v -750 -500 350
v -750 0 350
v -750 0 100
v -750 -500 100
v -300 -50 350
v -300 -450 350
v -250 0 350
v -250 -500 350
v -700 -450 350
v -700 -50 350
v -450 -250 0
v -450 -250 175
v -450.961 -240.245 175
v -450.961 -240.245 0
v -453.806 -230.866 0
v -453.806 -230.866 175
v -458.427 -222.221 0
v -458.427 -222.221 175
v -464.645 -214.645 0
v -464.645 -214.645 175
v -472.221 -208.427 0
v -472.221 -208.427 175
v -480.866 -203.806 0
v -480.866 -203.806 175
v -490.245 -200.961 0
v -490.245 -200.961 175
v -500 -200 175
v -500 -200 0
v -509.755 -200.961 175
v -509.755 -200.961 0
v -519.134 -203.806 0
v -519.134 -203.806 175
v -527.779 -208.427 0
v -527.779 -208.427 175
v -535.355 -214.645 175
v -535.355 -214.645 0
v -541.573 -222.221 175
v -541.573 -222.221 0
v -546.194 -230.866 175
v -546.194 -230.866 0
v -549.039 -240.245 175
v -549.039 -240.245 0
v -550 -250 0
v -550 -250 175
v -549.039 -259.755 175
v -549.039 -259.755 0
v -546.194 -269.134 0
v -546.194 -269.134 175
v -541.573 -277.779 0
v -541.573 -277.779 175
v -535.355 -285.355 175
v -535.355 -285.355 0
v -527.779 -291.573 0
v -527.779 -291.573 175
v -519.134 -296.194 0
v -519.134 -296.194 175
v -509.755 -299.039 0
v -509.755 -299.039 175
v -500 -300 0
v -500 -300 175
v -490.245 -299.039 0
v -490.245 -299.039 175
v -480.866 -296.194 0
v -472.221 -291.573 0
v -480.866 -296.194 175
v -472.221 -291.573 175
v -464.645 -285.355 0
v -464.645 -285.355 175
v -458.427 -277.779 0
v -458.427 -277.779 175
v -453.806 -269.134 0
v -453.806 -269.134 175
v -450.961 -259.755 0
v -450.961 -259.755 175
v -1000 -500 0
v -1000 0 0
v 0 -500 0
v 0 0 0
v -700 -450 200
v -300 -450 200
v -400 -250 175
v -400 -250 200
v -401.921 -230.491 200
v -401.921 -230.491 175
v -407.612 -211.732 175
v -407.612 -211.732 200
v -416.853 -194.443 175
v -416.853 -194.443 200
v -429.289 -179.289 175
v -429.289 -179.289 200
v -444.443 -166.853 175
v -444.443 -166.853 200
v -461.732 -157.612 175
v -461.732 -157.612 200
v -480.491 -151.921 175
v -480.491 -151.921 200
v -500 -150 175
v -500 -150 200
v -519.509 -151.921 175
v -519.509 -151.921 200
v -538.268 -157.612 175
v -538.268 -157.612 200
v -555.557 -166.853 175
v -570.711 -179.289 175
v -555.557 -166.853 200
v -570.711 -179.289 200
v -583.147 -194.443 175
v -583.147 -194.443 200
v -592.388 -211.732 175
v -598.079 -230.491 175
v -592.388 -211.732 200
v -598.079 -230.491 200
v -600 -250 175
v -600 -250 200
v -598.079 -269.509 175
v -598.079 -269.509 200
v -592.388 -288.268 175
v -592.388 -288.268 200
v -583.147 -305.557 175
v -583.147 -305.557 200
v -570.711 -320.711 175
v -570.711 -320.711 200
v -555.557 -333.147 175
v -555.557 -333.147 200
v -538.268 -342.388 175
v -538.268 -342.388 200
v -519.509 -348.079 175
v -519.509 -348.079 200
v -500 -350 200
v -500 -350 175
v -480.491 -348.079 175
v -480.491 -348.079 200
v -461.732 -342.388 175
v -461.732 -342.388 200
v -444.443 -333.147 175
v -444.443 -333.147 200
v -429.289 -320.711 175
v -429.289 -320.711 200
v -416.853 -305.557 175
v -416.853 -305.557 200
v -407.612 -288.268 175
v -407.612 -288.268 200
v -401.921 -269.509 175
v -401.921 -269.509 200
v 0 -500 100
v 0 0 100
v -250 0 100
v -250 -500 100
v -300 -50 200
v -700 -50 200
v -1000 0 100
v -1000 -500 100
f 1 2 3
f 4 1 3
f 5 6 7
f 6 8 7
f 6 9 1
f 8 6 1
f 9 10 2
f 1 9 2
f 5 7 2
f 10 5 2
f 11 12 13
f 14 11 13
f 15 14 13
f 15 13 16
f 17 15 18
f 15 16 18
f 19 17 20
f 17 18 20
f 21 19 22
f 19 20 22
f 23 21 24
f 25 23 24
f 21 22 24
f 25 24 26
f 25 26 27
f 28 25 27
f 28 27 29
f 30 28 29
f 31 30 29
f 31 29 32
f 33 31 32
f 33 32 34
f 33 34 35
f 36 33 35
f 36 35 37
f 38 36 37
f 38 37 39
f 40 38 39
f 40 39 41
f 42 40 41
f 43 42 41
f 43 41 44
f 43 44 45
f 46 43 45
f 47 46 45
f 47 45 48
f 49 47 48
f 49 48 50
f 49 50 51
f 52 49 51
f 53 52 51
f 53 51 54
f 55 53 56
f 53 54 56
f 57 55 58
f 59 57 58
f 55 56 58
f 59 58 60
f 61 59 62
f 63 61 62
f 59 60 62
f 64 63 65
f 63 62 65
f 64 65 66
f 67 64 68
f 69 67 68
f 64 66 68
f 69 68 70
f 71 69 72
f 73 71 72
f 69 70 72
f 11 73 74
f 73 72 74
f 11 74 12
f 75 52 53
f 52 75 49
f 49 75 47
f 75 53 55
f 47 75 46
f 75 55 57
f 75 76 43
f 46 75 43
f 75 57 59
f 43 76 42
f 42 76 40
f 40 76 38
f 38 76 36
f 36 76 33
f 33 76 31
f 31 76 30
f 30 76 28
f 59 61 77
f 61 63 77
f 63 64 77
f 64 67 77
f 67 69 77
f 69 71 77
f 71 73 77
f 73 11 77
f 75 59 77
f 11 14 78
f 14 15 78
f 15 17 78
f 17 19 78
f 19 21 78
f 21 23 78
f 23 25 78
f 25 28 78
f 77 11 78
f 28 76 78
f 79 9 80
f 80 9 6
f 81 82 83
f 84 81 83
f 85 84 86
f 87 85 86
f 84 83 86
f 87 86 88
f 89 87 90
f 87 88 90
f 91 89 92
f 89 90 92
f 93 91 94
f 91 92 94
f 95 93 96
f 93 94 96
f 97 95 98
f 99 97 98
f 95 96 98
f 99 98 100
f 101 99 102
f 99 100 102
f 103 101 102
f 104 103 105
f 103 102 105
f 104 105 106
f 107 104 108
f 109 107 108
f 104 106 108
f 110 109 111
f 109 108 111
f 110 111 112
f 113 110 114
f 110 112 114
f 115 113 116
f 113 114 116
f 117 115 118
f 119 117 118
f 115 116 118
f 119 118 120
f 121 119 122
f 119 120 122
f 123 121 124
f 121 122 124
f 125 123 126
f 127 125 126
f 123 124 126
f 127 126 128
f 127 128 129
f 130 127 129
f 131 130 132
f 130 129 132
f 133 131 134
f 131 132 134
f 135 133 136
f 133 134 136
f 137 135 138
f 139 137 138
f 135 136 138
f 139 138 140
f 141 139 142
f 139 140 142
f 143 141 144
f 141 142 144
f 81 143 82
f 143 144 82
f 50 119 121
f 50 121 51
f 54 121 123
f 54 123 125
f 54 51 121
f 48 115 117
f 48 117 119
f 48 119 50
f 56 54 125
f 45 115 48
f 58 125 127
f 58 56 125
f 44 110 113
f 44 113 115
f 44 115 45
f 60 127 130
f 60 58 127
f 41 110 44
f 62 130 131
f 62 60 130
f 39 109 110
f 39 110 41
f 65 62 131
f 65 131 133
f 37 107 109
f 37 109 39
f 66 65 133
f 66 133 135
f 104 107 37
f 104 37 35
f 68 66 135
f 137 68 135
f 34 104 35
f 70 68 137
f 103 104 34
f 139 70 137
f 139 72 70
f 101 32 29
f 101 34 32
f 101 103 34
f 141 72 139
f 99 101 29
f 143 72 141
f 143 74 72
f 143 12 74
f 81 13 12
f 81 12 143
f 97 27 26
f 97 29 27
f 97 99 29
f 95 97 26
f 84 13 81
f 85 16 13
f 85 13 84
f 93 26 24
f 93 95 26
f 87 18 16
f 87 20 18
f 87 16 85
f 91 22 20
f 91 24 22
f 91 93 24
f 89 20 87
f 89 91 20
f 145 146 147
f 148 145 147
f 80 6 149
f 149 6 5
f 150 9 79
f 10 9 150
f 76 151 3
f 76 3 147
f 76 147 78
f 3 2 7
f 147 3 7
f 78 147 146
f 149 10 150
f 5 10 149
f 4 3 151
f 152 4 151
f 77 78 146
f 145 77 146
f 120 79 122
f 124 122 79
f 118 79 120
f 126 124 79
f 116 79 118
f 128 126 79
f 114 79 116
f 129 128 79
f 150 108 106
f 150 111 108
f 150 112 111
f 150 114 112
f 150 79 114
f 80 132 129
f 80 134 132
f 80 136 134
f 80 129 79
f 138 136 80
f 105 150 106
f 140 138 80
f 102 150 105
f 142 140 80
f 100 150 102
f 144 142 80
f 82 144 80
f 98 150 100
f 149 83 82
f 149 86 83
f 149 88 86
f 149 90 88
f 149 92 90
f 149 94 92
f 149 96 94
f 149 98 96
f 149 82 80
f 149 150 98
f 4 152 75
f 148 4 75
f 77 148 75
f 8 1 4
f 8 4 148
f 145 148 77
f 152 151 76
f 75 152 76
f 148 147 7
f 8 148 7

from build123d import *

# Parameters (mm, degrees)
F1_DEPTH = 500
F2_W     = 400
F2_H     = 400
F3_DEPTH = 150
F4_R     = 100
F4_R_2   = 50
F5_DEPTH = 25
F6_DEPTH = 200


with BuildPart() as f1:
    # F0 (on Front) → F1 (new body)
    with BuildSketch(Plane.XZ):
        Polygon((-1000, 0), (0, 0), (0, 100), (-250, 100), (-250, 350), (-750, 350), (-750, 100), (-1000, 100), align=None)
    extrude(amount=F1_DEPTH)

    # F2 (on face) → F3 (cut)
    with BuildSketch(Plane.XY.offset(350)):
        with Locations((-500, -250)):
            Rectangle(F2_W, F2_H)
    extrude(amount=-F3_DEPTH, mode=Mode.SUBTRACT)

    # F4 (on face) → F5 (cut)
    with BuildSketch(Plane.XY.offset(200)):
        with Locations((-500, -250)):
            Circle(F4_R)
        with Locations((-500, -250)):
            Circle(F4_R_2, mode=Mode.SUBTRACT)
    extrude(amount=-F5_DEPTH, mode=Mode.SUBTRACT)

    # F4 (on face) → F6 (cut)
    with BuildSketch(Plane.XY.offset(200)):
        with Locations((-500, -250)):
            Circle(F4_R_2)
    extrude(amount=-F6_DEPTH, mode=Mode.SUBTRACT)


solid = f1.part
